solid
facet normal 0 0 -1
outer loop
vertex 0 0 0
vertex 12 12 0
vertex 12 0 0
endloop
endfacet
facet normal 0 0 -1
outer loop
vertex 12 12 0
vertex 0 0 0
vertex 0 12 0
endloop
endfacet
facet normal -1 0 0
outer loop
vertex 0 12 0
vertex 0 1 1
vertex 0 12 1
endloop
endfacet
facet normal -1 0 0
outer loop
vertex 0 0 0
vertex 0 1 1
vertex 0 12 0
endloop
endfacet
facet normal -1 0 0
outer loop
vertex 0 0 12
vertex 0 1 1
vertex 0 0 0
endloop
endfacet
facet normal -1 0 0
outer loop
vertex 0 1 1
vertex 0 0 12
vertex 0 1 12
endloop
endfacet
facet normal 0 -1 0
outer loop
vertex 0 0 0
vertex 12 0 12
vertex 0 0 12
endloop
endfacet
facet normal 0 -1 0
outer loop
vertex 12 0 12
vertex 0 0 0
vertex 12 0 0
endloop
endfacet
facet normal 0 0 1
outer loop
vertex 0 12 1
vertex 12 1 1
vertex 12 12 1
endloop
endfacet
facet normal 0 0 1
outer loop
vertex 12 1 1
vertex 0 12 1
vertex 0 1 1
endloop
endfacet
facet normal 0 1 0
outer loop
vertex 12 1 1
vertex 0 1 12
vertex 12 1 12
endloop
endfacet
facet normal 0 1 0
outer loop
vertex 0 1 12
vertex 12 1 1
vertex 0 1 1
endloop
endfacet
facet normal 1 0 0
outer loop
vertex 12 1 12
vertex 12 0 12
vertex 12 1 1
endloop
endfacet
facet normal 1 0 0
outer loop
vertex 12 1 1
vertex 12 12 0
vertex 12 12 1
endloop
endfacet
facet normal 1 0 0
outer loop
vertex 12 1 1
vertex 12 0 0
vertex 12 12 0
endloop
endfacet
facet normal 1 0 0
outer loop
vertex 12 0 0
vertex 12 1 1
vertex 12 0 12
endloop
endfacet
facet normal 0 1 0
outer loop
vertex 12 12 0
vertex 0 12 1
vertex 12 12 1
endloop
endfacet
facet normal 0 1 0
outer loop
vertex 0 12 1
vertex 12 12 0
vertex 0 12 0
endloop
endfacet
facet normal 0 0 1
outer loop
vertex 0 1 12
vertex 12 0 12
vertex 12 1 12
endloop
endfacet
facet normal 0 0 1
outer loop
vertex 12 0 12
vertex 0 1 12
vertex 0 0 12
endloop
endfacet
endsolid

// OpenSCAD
union() {
    translate([0, 0, 0]) cube([1, 1, 1]);
    translate([1, 0, 0]) cube([1, 1, 1]);
    translate([2, 0, 0]) cube([1, 1, 1]);
    translate([3, 0, 0]) cube([1, 1, 1]);
    translate([4, 0, 0]) cube([1, 1, 1]);
    translate([5, 0, 0]) cube([1, 1, 1]);
    translate([6, 0, 0]) cube([1, 1, 1]);
    translate([7, 0, 0]) cube([1, 1, 1]);
    translate([8, 0, 0]) cube([1, 1, 1]);
    translate([9, 0, 0]) cube([1, 1, 1]);
    translate([10, 0, 0]) cube([1, 1, 1]);
    translate([11, 0, 0]) cube([1, 1, 1]);
    translate([0, 1, 0]) cube([1, 1, 1]);
    translate([1, 1, 0]) cube([1, 1, 1]);
    translate([2, 1, 0]) cube([1, 1, 1]);
    translate([3, 1, 0]) cube([1, 1, 1]);
    translate([4, 1, 0]) cube([1, 1, 1]);
    translate([5, 1, 0]) cube([1, 1, 1]);
    translate([6, 1, 0]) cube([1, 1, 1]);
    translate([7, 1, 0]) cube([1, 1, 1]);
    translate([8, 1, 0]) cube([1, 1, 1]);
    translate([9, 1, 0]) cube([1, 1, 1]);
    translate([10, 1, 0]) cube([1, 1, 1]);
    translate([11, 1, 0]) cube([1, 1, 1]);
    translate([0, 2, 0]) cube([1, 1, 1]);
    translate([1, 2, 0]) cube([1, 1, 1]);
    translate([2, 2, 0]) cube([1, 1, 1]);
    translate([3, 2, 0]) cube([1, 1, 1]);
    translate([4, 2, 0]) cube([1, 1, 1]);
    translate([5, 2, 0]) cube([1, 1, 1]);
    translate([6, 2, 0]) cube([1, 1, 1]);
    translate([7, 2, 0]) cube([1, 1, 1]);
    translate([8, 2, 0]) cube([1, 1, 1]);
    translate([9, 2, 0]) cube([1, 1, 1]);
    translate([10, 2, 0]) cube([1, 1, 1]);
    translate([11, 2, 0]) cube([1, 1, 1]);
    translate([0, 3, 0]) cube([1, 1, 1]);
    translate([1, 3, 0]) cube([1, 1, 1]);
    translate([2, 3, 0]) cube([1, 1, 1]);
    translate([3, 3, 0]) cube([1, 1, 1]);
    translate([4, 3, 0]) cube([1, 1, 1]);
    translate([5, 3, 0]) cube([1, 1, 1]);
    translate([6, 3, 0]) cube([1, 1, 1]);
    translate([7, 3, 0]) cube([1, 1, 1]);
    translate([8, 3, 0]) cube([1, 1, 1]);
    translate([9, 3, 0]) cube([1, 1, 1]);
    translate([10, 3, 0]) cube([1, 1, 1]);
    translate([11, 3, 0]) cube([1, 1, 1]);
    translate([0, 4, 0]) cube([1, 1, 1]);
    translate([1, 4, 0]) cube([1, 1, 1]);
    translate([2, 4, 0]) cube([1, 1, 1]);
    translate([3, 4, 0]) cube([1, 1, 1]);
    translate([4, 4, 0]) cube([1, 1, 1]);
    translate([5, 4, 0]) cube([1, 1, 1]);
    translate([6, 4, 0]) cube([1, 1, 1]);
    translate([7, 4, 0]) cube([1, 1, 1]);
    translate([8, 4, 0]) cube([1, 1, 1]);
    translate([9, 4, 0]) cube([1, 1, 1]);
    translate([10, 4, 0]) cube([1, 1, 1]);
    translate([11, 4, 0]) cube([1, 1, 1]);
    translate([0, 5, 0]) cube([1, 1, 1]);
    translate([1, 5, 0]) cube([1, 1, 1]);
    translate([2, 5, 0]) cube([1, 1, 1]);
    translate([3, 5, 0]) cube([1, 1, 1]);
    translate([4, 5, 0]) cube([1, 1, 1]);
    translate([5, 5, 0]) cube([1, 1, 1]);
    translate([6, 5, 0]) cube([1, 1, 1]);
    translate([7, 5, 0]) cube([1, 1, 1]);
    translate([8, 5, 0]) cube([1, 1, 1]);
    translate([9, 5, 0]) cube([1, 1, 1]);
    translate([10, 5, 0]) cube([1, 1, 1]);
    translate([11, 5, 0]) cube([1, 1, 1]);
    translate([0, 6, 0]) cube([1, 1, 1]);
    translate([1, 6, 0]) cube([1, 1, 1]);
    translate([2, 6, 0]) cube([1, 1, 1]);
    translate([3, 6, 0]) cube([1, 1, 1]);
    translate([4, 6, 0]) cube([1, 1, 1]);
    translate([5, 6, 0]) cube([1, 1, 1]);
    translate([6, 6, 0]) cube([1, 1, 1]);
    translate([7, 6, 0]) cube([1, 1, 1]);
    translate([8, 6, 0]) cube([1, 1, 1]);
    translate([9, 6, 0]) cube([1, 1, 1]);
    translate([10, 6, 0]) cube([1, 1, 1]);
    translate([11, 6, 0]) cube([1, 1, 1]);
    translate([0, 7, 0]) cube([1, 1, 1]);
    translate([1, 7, 0]) cube([1, 1, 1]);
    translate([2, 7, 0]) cube([1, 1, 1]);
    translate([3, 7, 0]) cube([1, 1, 1]);
    translate([4, 7, 0]) cube([1, 1, 1]);
    translate([5, 7, 0]) cube([1, 1, 1]);
    translate([6, 7, 0]) cube([1, 1, 1]);
    translate([7, 7, 0]) cube([1, 1, 1]);
    translate([8, 7, 0]) cube([1, 1, 1]);
    translate([9, 7, 0]) cube([1, 1, 1]);
    translate([10, 7, 0]) cube([1, 1, 1]);
    translate([11, 7, 0]) cube([1, 1, 1]);
    translate([0, 8, 0]) cube([1, 1, 1]);
    translate([1, 8, 0]) cube([1, 1, 1]);
    translate([2, 8, 0]) cube([1, 1, 1]);
    translate([3, 8, 0]) cube([1, 1, 1]);
    translate([4, 8, 0]) cube([1, 1, 1]);
    translate([5, 8, 0]) cube([1, 1, 1]);
    translate([6, 8, 0]) cube([1, 1, 1]);
    translate([7, 8, 0]) cube([1, 1, 1]);
    translate([8, 8, 0]) cube([1, 1, 1]);
    translate([9, 8, 0]) cube([1, 1, 1]);
    translate([10, 8, 0]) cube([1, 1, 1]);
    translate([11, 8, 0]) cube([1, 1, 1]);
    translate([0, 9, 0]) cube([1, 1, 1]);
    translate([1, 9, 0]) cube([1, 1, 1]);
    translate([2, 9, 0]) cube([1, 1, 1]);
    translate([3, 9, 0]) cube([1, 1, 1]);
    translate([4, 9, 0]) cube([1, 1, 1]);
    translate([5, 9, 0]) cube([1, 1, 1]);
    translate([6, 9, 0]) cube([1, 1, 1]);
    translate([7, 9, 0]) cube([1, 1, 1]);
    translate([8, 9, 0]) cube([1, 1, 1]);
    translate([9, 9, 0]) cube([1, 1, 1]);
    translate([10, 9, 0]) cube([1, 1, 1]);
    translate([11, 9, 0]) cube([1, 1, 1]);
    translate([0, 10, 0]) cube([1, 1, 1]);
    translate([1, 10, 0]) cube([1, 1, 1]);
    translate([2, 10, 0]) cube([1, 1, 1]);
    translate([3, 10, 0]) cube([1, 1, 1]);
    translate([4, 10, 0]) cube([1, 1, 1]);
    translate([5, 10, 0]) cube([1, 1, 1]);
    translate([6, 10, 0]) cube([1, 1, 1]);
    translate([7, 10, 0]) cube([1, 1, 1]);
    translate([8, 10, 0]) cube([1, 1, 1]);
    translate([9, 10, 0]) cube([1, 1, 1]);
    translate([10, 10, 0]) cube([1, 1, 1]);
    translate([11, 10, 0]) cube([1, 1, 1]);
    translate([0, 11, 0]) cube([1, 1, 1]);
    translate([1, 11, 0]) cube([1, 1, 1]);
    translate([2, 11, 0]) cube([1, 1, 1]);
    translate([3, 11, 0]) cube([1, 1, 1]);
    translate([4, 11, 0]) cube([1, 1, 1]);
    translate([5, 11, 0]) cube([1, 1, 1]);
    translate([6, 11, 0]) cube([1, 1, 1]);
    translate([7, 11, 0]) cube([1, 1, 1]);
    translate([8, 11, 0]) cube([1, 1, 1]);
    translate([9, 11, 0]) cube([1, 1, 1]);
    translate([10, 11, 0]) cube([1, 1, 1]);
    translate([11, 11, 0]) cube([1, 1, 1]);
    translate([0, 0, 1]) cube([1, 1, 1]);
    translate([1, 0, 1]) cube([1, 1, 1]);
    translate([2, 0, 1]) cube([1, 1, 1]);
    translate([3, 0, 1]) cube([1, 1, 1]);
    translate([4, 0, 1]) cube([1, 1, 1]);
    translate([5, 0, 1]) cube([1, 1, 1]);
    translate([6, 0, 1]) cube([1, 1, 1]);
    translate([7, 0, 1]) cube([1, 1, 1]);
    translate([8, 0, 1]) cube([1, 1, 1]);
    translate([9, 0, 1]) cube([1, 1, 1]);
    translate([10, 0, 1]) cube([1, 1, 1]);
    translate([11, 0, 1]) cube([1, 1, 1]);
    translate([0, 0, 2]) cube([1, 1, 1]);
    translate([1, 0, 2]) cube([1, 1, 1]);
    translate([2, 0, 2]) cube([1, 1, 1]);
    translate([3, 0, 2]) cube([1, 1, 1]);
    translate([4, 0, 2]) cube([1, 1, 1]);
    translate([5, 0, 2]) cube([1, 1, 1]);
    translate([6, 0, 2]) cube([1, 1, 1]);
    translate([7, 0, 2]) cube([1, 1, 1]);
    translate([8, 0, 2]) cube([1, 1, 1]);
    translate([9, 0, 2]) cube([1, 1, 1]);
    translate([10, 0, 2]) cube([1, 1, 1]);
    translate([11, 0, 2]) cube([1, 1, 1]);
    translate([0, 0, 3]) cube([1, 1, 1]);
    translate([1, 0, 3]) cube([1, 1, 1]);
    translate([2, 0, 3]) cube([1, 1, 1]);
    translate([3, 0, 3]) cube([1, 1, 1]);
    translate([4, 0, 3]) cube([1, 1, 1]);
    translate([5, 0, 3]) cube([1, 1, 1]);
    translate([6, 0, 3]) cube([1, 1, 1]);
    translate([7, 0, 3]) cube([1, 1, 1]);
    translate([8, 0, 3]) cube([1, 1, 1]);
    translate([9, 0, 3]) cube([1, 1, 1]);
    translate([10, 0, 3]) cube([1, 1, 1]);
    translate([11, 0, 3]) cube([1, 1, 1]);
    translate([0, 0, 4]) cube([1, 1, 1]);
    translate([1, 0, 4]) cube([1, 1, 1]);
    translate([2, 0, 4]) cube([1, 1, 1]);
    translate([3, 0, 4]) cube([1, 1, 1]);
    translate([4, 0, 4]) cube([1, 1, 1]);
    translate([5, 0, 4]) cube([1, 1, 1]);
    translate([6, 0, 4]) cube([1, 1, 1]);
    translate([7, 0, 4]) cube([1, 1, 1]);
    translate([8, 0, 4]) cube([1, 1, 1]);
    translate([9, 0, 4]) cube([1, 1, 1]);
    translate([10, 0, 4]) cube([1, 1, 1]);
    translate([11, 0, 4]) cube([1, 1, 1]);
    translate([0, 0, 5]) cube([1, 1, 1]);
    translate([1, 0, 5]) cube([1, 1, 1]);
    translate([2, 0, 5]) cube([1, 1, 1]);
    translate([3, 0, 5]) cube([1, 1, 1]);
    translate([4, 0, 5]) cube([1, 1, 1]);
    translate([5, 0, 5]) cube([1, 1, 1]);
    translate([6, 0, 5]) cube([1, 1, 1]);
    translate([7, 0, 5]) cube([1, 1, 1]);
    translate([8, 0, 5]) cube([1, 1, 1]);
    translate([9, 0, 5]) cube([1, 1, 1]);
    translate([10, 0, 5]) cube([1, 1, 1]);
    translate([11, 0, 5]) cube([1, 1, 1]);
    translate([0, 0, 6]) cube([1, 1, 1]);
    translate([1, 0, 6]) cube([1, 1, 1]);
    translate([2, 0, 6]) cube([1, 1, 1]);
    translate([3, 0, 6]) cube([1, 1, 1]);
    translate([4, 0, 6]) cube([1, 1, 1]);
    translate([5, 0, 6]) cube([1, 1, 1]);
    translate([6, 0, 6]) cube([1, 1, 1]);
    translate([7, 0, 6]) cube([1, 1, 1]);
    translate([8, 0, 6]) cube([1, 1, 1]);
    translate([9, 0, 6]) cube([1, 1, 1]);
    translate([10, 0, 6]) cube([1, 1, 1]);
    translate([11, 0, 6]) cube([1, 1, 1]);
    translate([0, 0, 7]) cube([1, 1, 1]);
    translate([1, 0, 7]) cube([1, 1, 1]);
    translate([2, 0, 7]) cube([1, 1, 1]);
    translate([3, 0, 7]) cube([1, 1, 1]);
    translate([4, 0, 7]) cube([1, 1, 1]);
    translate([5, 0, 7]) cube([1, 1, 1]);
    translate([6, 0, 7]) cube([1, 1, 1]);
    translate([7, 0, 7]) cube([1, 1, 1]);
    translate([8, 0, 7]) cube([1, 1, 1]);
    translate([9, 0, 7]) cube([1, 1, 1]);
    translate([10, 0, 7]) cube([1, 1, 1]);
    translate([11, 0, 7]) cube([1, 1, 1]);
    translate([0, 0, 8]) cube([1, 1, 1]);
    translate([1, 0, 8]) cube([1, 1, 1]);
    translate([2, 0, 8]) cube([1, 1, 1]);
    translate([3, 0, 8]) cube([1, 1, 1]);
    translate([4, 0, 8]) cube([1, 1, 1]);
    translate([5, 0, 8]) cube([1, 1, 1]);
    translate([6, 0, 8]) cube([1, 1, 1]);
    translate([7, 0, 8]) cube([1, 1, 1]);
    translate([8, 0, 8]) cube([1, 1, 1]);
    translate([9, 0, 8]) cube([1, 1, 1]);
    translate([10, 0, 8]) cube([1, 1, 1]);
    translate([11, 0, 8]) cube([1, 1, 1]);
    translate([0, 0, 9]) cube([1, 1, 1]);
    translate([1, 0, 9]) cube([1, 1, 1]);
    translate([2, 0, 9]) cube([1, 1, 1]);
    translate([3, 0, 9]) cube([1, 1, 1]);
    translate([4, 0, 9]) cube([1, 1, 1]);
    translate([5, 0, 9]) cube([1, 1, 1]);
    translate([6, 0, 9]) cube([1, 1, 1]);
    translate([7, 0, 9]) cube([1, 1, 1]);
    translate([8, 0, 9]) cube([1, 1, 1]);
    translate([9, 0, 9]) cube([1, 1, 1]);
    translate([10, 0, 9]) cube([1, 1, 1]);
    translate([11, 0, 9]) cube([1, 1, 1]);
    translate([0, 0, 10]) cube([1, 1, 1]);
    translate([1, 0, 10]) cube([1, 1, 1]);
    translate([2, 0, 10]) cube([1, 1, 1]);
    translate([3, 0, 10]) cube([1, 1, 1]);
    translate([4, 0, 10]) cube([1, 1, 1]);
    translate([5, 0, 10]) cube([1, 1, 1]);
    translate([6, 0, 10]) cube([1, 1, 1]);
    translate([7, 0, 10]) cube([1, 1, 1]);
    translate([8, 0, 10]) cube([1, 1, 1]);
    translate([9, 0, 10]) cube([1, 1, 1]);
    translate([10, 0, 10]) cube([1, 1, 1]);
    translate([11, 0, 10]) cube([1, 1, 1]);
    translate([0, 0, 11]) cube([1, 1, 1]);
    translate([1, 0, 11]) cube([1, 1, 1]);
    translate([2, 0, 11]) cube([1, 1, 1]);
    translate([3, 0, 11]) cube([1, 1, 1]);
    translate([4, 0, 11]) cube([1, 1, 1]);
    translate([5, 0, 11]) cube([1, 1, 1]);
    translate([6, 0, 11]) cube([1, 1, 1]);
    translate([7, 0, 11]) cube([1, 1, 1]);
    translate([8, 0, 11]) cube([1, 1, 1]);
    translate([9, 0, 11]) cube([1, 1, 1]);
    translate([10, 0, 11]) cube([1, 1, 1]);
    translate([11, 0, 11]) cube([1, 1, 1]);
}
